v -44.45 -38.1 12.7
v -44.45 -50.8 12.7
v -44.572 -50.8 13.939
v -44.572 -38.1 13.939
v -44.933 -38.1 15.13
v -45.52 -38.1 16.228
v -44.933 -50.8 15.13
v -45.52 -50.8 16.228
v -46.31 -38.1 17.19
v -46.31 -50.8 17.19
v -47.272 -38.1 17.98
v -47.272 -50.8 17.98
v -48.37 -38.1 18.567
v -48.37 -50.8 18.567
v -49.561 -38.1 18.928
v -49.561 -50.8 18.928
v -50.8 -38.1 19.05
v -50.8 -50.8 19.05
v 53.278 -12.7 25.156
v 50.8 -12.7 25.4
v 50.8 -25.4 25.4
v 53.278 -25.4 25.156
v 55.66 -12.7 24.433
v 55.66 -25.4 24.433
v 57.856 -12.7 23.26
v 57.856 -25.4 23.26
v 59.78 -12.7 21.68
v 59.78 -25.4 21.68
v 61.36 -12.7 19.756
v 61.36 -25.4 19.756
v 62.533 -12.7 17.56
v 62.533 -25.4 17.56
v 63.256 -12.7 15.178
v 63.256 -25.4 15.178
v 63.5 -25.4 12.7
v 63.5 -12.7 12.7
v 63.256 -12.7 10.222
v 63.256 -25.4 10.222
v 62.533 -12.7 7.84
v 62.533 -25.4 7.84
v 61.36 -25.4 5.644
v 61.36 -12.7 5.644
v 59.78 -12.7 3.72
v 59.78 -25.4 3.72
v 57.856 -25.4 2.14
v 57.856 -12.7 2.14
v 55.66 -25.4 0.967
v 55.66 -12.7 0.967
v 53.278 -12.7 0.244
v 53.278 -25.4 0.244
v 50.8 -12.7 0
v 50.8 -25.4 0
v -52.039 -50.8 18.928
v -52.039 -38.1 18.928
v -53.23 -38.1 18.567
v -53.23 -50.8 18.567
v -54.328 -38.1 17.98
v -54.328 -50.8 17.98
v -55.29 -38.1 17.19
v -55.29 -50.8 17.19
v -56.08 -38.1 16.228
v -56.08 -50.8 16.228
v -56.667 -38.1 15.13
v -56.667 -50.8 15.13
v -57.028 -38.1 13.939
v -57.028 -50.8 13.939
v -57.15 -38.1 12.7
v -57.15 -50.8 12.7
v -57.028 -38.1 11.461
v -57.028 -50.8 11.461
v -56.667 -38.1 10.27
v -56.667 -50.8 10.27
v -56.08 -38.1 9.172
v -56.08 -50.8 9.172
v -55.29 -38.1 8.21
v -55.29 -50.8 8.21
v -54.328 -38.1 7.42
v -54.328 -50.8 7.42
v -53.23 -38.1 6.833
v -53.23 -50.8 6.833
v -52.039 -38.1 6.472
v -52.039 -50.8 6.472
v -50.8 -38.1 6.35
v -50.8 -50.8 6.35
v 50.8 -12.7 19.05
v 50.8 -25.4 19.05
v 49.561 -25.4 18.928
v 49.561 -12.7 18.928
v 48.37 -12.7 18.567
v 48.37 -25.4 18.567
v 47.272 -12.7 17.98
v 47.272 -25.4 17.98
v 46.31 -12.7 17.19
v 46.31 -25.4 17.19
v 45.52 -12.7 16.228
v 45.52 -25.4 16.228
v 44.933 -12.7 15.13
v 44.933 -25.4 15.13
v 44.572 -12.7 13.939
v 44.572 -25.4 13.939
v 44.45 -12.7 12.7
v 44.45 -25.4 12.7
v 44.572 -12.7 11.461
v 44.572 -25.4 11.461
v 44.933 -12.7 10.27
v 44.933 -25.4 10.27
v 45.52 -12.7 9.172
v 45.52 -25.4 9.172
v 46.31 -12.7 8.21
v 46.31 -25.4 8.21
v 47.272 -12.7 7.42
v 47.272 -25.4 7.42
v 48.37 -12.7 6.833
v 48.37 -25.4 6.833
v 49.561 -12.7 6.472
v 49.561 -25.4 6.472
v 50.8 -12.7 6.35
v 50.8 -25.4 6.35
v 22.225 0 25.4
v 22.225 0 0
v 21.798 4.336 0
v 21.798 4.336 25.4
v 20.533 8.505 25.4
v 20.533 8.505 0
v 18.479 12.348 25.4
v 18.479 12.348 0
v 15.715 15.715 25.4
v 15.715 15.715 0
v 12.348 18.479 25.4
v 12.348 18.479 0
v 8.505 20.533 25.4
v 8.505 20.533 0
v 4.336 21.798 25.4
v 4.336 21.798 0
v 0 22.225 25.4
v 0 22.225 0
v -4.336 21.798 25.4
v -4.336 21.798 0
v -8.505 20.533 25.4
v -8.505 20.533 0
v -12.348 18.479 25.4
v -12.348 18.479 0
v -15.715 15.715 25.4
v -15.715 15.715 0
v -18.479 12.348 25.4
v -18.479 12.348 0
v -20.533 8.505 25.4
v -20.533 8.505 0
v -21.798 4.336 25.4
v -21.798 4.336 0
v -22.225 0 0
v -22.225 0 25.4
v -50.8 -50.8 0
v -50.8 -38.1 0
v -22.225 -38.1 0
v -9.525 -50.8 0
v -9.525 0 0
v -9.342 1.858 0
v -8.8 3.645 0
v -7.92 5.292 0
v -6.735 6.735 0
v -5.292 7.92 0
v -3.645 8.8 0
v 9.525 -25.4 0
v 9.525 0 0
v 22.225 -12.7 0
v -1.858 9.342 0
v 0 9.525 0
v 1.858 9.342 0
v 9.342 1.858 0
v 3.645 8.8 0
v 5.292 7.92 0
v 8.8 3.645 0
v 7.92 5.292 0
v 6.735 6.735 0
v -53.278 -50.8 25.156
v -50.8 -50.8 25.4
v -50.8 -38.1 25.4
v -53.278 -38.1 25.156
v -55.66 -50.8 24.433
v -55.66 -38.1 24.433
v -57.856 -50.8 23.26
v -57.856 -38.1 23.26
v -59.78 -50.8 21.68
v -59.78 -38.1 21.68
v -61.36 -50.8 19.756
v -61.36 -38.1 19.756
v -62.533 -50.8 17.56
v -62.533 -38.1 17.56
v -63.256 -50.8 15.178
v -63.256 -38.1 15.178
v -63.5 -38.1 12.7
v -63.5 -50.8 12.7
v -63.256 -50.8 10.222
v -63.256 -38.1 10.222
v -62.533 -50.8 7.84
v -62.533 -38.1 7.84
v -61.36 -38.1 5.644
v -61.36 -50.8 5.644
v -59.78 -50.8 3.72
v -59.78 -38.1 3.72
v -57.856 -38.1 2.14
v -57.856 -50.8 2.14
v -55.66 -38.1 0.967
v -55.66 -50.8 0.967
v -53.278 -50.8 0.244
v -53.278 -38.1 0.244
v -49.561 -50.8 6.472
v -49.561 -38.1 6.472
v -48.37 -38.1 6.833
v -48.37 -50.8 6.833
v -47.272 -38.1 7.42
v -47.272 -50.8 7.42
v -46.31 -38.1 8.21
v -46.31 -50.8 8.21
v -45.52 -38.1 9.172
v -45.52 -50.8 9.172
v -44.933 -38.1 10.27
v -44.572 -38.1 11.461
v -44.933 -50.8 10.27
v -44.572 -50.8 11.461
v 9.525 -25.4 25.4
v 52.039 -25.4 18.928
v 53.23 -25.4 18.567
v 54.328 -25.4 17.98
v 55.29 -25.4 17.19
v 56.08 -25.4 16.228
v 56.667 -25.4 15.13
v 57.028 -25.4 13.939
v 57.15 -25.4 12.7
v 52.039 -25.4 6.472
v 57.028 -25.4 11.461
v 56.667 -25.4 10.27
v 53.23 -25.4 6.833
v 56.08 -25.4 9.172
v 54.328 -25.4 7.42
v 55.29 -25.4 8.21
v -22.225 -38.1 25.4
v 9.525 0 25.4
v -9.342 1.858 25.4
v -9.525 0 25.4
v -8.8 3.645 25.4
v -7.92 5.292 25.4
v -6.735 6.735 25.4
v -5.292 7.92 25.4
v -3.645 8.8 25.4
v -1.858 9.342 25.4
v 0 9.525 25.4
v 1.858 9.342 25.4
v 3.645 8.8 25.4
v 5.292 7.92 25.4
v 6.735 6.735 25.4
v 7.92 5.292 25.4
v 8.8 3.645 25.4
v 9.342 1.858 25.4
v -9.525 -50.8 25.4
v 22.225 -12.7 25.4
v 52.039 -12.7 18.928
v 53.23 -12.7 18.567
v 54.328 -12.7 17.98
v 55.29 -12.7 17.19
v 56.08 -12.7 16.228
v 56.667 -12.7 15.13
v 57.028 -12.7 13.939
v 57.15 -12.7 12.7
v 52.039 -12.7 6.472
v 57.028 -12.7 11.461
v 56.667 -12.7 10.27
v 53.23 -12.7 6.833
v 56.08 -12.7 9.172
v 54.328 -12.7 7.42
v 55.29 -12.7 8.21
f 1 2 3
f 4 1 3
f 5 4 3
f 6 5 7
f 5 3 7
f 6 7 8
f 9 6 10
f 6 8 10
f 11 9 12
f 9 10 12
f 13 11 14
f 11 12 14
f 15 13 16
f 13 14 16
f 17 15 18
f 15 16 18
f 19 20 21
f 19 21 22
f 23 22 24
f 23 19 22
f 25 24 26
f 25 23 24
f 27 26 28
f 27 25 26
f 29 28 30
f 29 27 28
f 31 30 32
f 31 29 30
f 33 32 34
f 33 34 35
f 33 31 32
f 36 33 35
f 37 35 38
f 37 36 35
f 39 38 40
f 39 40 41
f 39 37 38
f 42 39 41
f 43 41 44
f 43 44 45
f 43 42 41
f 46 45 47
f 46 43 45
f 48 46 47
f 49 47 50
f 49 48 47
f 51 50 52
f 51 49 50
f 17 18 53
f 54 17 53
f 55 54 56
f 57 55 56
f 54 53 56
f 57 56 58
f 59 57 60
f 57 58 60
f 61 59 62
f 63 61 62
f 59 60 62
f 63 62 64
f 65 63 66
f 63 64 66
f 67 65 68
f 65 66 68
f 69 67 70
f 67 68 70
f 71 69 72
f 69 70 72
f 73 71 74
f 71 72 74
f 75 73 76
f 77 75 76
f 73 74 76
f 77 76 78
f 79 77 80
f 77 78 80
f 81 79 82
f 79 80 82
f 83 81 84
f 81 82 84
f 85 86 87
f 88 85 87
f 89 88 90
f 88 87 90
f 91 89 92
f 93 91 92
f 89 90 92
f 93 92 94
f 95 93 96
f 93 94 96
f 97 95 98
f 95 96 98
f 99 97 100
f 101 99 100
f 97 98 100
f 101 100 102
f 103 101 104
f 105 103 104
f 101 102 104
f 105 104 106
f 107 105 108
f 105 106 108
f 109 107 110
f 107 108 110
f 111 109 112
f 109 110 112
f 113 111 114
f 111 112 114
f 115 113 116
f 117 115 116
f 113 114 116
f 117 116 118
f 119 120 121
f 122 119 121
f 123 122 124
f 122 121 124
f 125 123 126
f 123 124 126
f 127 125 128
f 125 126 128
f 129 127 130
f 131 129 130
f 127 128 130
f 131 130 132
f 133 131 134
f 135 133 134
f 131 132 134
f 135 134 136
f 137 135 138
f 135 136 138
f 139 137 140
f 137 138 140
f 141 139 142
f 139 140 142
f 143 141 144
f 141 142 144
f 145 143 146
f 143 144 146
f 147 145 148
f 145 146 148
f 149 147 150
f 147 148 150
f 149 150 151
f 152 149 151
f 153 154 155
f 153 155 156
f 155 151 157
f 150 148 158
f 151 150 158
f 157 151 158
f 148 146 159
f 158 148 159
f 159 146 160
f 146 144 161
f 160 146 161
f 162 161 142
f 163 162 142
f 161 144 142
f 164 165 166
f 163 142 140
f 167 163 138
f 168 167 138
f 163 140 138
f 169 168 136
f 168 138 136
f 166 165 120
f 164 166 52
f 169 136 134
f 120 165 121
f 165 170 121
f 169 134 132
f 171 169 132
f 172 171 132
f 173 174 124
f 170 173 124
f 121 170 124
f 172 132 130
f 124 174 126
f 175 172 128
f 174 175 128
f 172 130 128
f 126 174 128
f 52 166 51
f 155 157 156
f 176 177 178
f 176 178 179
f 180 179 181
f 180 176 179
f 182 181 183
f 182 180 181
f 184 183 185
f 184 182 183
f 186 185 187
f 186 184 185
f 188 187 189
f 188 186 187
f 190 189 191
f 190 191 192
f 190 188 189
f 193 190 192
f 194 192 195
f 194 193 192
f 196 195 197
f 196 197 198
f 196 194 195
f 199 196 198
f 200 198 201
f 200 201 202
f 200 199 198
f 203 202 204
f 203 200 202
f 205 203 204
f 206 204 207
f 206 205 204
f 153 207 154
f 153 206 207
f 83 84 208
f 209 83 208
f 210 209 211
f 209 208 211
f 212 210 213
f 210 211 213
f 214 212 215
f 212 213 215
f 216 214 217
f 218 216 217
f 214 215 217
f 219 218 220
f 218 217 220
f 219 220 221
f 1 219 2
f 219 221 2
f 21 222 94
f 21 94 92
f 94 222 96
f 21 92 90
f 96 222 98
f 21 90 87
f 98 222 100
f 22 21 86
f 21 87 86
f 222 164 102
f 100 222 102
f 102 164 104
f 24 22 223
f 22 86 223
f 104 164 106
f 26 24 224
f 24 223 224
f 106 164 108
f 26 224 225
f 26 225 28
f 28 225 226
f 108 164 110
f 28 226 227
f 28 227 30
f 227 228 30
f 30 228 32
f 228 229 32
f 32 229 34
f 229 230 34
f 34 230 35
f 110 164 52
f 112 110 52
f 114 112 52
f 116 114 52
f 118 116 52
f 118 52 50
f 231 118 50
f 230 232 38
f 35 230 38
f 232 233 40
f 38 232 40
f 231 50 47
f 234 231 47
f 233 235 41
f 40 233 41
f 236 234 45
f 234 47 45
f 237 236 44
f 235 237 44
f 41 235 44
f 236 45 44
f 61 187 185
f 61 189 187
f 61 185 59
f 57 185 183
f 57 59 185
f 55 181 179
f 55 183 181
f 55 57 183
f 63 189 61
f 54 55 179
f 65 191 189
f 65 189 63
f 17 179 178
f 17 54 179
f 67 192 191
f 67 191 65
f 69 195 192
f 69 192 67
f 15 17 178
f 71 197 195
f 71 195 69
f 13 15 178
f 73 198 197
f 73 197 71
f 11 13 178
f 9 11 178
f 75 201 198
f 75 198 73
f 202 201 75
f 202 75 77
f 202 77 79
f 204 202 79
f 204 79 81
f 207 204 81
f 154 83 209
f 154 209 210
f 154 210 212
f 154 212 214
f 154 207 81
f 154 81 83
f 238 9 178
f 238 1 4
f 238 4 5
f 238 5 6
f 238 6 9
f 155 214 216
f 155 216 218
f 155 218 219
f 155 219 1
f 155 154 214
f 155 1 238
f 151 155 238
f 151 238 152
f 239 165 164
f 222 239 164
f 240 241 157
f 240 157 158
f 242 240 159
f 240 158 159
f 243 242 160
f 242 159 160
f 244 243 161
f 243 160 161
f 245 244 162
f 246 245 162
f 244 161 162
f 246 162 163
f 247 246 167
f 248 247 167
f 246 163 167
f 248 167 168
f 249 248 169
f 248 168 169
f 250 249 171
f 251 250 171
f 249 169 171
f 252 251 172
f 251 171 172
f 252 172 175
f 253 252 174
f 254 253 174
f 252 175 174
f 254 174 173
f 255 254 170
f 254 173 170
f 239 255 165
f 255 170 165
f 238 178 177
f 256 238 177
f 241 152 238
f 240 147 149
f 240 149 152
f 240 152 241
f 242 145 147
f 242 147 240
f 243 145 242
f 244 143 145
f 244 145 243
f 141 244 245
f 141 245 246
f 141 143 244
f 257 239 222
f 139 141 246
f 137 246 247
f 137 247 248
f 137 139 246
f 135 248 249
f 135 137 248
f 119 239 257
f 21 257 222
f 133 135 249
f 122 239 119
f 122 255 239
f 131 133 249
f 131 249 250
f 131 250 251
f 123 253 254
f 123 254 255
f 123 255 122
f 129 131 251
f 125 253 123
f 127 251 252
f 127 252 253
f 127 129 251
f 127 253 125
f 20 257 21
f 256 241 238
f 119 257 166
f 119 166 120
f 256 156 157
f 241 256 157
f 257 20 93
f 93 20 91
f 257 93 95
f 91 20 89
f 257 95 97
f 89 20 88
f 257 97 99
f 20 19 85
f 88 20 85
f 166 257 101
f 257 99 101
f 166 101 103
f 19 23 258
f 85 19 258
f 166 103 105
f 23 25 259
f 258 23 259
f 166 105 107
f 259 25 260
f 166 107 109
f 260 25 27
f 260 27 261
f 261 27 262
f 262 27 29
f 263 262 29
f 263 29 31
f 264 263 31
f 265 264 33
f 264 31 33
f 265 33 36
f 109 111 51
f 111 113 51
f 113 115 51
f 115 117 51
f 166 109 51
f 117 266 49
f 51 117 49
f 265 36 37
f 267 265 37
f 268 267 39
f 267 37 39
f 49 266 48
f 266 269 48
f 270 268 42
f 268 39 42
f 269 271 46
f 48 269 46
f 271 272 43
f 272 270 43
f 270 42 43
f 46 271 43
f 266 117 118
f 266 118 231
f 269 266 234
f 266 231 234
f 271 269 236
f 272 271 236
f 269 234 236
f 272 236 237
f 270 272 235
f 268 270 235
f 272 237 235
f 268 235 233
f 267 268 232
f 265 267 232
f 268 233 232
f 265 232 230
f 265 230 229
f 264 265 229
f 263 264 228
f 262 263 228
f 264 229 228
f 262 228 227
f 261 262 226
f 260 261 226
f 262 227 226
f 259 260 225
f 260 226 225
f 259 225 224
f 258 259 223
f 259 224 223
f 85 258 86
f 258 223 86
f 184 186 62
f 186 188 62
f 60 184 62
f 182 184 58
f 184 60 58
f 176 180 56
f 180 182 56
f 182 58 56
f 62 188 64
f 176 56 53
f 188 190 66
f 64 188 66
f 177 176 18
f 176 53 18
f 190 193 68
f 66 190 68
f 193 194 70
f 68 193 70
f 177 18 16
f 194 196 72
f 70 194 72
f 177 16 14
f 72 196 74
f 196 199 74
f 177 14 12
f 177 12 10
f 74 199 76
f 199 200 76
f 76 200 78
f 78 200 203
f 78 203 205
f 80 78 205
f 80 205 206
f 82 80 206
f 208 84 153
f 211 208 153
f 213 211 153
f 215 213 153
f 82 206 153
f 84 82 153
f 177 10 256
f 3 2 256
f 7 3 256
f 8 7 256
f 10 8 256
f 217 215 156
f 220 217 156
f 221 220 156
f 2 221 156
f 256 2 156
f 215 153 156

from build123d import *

# Parameters (mm, degrees)
F0_W     = 28.575
F0_H     = 12.7
F0_W_2   = 12.7
F0_H_2   = 38.1
F1_DEPTH = 25.4
F2_W     = 12.7
F2_H     = 12.7
F4_W     = 12.7
F4_H     = 12.7
F7_DEPTH = 25.4
F9_DEPTH = 25.4


with BuildPart() as f1:
    # F0 (on Top) → F1 (new body)
    with BuildSketch(Plane.XY):
        with Locations((-36.5125, -44.45)):
            Rectangle(F0_W, F0_H)
        with Locations((-15.875, -19.05)):
            Rectangle(F0_W_2, F0_H_2)
        with BuildLine():
            ThreePointArc((22.225, 0), (0, 22.225), (-22.225, 0))
            Line((-22.225, 0), (-9.525, 0))
            ThreePointArc((-9.525, 0), (0, 9.525), (9.525, 0))
            Line((9.525, 0), (22.225, 0))
        make_face()
        with Locations((15.875, -6.35)):
            Rectangle(F0_W_2, F0_H)
        with Locations((15.875, -19.05)):
            Rectangle(F0_W_2, F0_H)
        with Locations((36.5125, -19.05)):
            Rectangle(F0_W, F0_H)
        with Locations((-15.875, -44.45)):
            Rectangle(F0_W_2, F0_H)
    extrude(amount=F1_DEPTH)

    # F2 (on face) → F3 (revolve)
    with BuildSketch(Plane(origin=(-50.8, 0, 0), x_dir=(0, -1, 0), z_dir=(-1, 0, 0))):
        with Locations((44.45, 19.05)):
            Rectangle(F2_W, F2_H)
    revolve(axis=Axis((-50.8, -44.45, 12.7), (0, -1, 0)))

    # F4 (on face) → F5 (revolve)
    with BuildSketch(Plane.YZ.offset(50.8)):
        with Locations((-19.05, 19.05)):
            Rectangle(F4_W, F4_H)
    revolve(axis=Axis((50.8, -19.05, 12.7), (0, 1, 0)))

    # F6 (on face) → F7 (cut)
    with BuildSketch(Plane.XZ.offset(25.4)):
        with BuildLine():
            ThreePointArc((57.15, 12.7), (55.290128, 17.190128), (50.8, 19.05))
            Line((50.8, 19.05), (50.8, 6.35))
            ThreePointArc((50.8, 6.35), (55.290128, 8.209872), (57.15, 12.7))
        make_face()
        with BuildLine():
            Line((50.8, 6.35), (50.8, 19.05))
            ThreePointArc((50.8, 19.05), (44.45, 12.7), (50.8, 6.35))
        make_face()
    extrude(amount=-F7_DEPTH, mode=Mode.SUBTRACT)

    # F8 (on face) → F9 (cut)
    with BuildSketch(Plane.XZ.offset(50.8)):
        with BuildLine():
            ThreePointArc((-44.45, 12.7), (-46.309872, 17.190128), (-50.8, 19.05))
            Line((-50.8, 19.05), (-50.8, 6.35))
            ThreePointArc((-50.8, 6.35), (-46.309872, 8.209872), (-44.45, 12.7))
        make_face()
        with BuildLine():
            Line((-50.8, 6.35), (-50.8, 19.05))
            ThreePointArc((-50.8, 19.05), (-57.15, 12.7), (-50.8, 6.35))
        make_face()
    extrude(amount=-F9_DEPTH, mode=Mode.SUBTRACT)


solid = f1.part
